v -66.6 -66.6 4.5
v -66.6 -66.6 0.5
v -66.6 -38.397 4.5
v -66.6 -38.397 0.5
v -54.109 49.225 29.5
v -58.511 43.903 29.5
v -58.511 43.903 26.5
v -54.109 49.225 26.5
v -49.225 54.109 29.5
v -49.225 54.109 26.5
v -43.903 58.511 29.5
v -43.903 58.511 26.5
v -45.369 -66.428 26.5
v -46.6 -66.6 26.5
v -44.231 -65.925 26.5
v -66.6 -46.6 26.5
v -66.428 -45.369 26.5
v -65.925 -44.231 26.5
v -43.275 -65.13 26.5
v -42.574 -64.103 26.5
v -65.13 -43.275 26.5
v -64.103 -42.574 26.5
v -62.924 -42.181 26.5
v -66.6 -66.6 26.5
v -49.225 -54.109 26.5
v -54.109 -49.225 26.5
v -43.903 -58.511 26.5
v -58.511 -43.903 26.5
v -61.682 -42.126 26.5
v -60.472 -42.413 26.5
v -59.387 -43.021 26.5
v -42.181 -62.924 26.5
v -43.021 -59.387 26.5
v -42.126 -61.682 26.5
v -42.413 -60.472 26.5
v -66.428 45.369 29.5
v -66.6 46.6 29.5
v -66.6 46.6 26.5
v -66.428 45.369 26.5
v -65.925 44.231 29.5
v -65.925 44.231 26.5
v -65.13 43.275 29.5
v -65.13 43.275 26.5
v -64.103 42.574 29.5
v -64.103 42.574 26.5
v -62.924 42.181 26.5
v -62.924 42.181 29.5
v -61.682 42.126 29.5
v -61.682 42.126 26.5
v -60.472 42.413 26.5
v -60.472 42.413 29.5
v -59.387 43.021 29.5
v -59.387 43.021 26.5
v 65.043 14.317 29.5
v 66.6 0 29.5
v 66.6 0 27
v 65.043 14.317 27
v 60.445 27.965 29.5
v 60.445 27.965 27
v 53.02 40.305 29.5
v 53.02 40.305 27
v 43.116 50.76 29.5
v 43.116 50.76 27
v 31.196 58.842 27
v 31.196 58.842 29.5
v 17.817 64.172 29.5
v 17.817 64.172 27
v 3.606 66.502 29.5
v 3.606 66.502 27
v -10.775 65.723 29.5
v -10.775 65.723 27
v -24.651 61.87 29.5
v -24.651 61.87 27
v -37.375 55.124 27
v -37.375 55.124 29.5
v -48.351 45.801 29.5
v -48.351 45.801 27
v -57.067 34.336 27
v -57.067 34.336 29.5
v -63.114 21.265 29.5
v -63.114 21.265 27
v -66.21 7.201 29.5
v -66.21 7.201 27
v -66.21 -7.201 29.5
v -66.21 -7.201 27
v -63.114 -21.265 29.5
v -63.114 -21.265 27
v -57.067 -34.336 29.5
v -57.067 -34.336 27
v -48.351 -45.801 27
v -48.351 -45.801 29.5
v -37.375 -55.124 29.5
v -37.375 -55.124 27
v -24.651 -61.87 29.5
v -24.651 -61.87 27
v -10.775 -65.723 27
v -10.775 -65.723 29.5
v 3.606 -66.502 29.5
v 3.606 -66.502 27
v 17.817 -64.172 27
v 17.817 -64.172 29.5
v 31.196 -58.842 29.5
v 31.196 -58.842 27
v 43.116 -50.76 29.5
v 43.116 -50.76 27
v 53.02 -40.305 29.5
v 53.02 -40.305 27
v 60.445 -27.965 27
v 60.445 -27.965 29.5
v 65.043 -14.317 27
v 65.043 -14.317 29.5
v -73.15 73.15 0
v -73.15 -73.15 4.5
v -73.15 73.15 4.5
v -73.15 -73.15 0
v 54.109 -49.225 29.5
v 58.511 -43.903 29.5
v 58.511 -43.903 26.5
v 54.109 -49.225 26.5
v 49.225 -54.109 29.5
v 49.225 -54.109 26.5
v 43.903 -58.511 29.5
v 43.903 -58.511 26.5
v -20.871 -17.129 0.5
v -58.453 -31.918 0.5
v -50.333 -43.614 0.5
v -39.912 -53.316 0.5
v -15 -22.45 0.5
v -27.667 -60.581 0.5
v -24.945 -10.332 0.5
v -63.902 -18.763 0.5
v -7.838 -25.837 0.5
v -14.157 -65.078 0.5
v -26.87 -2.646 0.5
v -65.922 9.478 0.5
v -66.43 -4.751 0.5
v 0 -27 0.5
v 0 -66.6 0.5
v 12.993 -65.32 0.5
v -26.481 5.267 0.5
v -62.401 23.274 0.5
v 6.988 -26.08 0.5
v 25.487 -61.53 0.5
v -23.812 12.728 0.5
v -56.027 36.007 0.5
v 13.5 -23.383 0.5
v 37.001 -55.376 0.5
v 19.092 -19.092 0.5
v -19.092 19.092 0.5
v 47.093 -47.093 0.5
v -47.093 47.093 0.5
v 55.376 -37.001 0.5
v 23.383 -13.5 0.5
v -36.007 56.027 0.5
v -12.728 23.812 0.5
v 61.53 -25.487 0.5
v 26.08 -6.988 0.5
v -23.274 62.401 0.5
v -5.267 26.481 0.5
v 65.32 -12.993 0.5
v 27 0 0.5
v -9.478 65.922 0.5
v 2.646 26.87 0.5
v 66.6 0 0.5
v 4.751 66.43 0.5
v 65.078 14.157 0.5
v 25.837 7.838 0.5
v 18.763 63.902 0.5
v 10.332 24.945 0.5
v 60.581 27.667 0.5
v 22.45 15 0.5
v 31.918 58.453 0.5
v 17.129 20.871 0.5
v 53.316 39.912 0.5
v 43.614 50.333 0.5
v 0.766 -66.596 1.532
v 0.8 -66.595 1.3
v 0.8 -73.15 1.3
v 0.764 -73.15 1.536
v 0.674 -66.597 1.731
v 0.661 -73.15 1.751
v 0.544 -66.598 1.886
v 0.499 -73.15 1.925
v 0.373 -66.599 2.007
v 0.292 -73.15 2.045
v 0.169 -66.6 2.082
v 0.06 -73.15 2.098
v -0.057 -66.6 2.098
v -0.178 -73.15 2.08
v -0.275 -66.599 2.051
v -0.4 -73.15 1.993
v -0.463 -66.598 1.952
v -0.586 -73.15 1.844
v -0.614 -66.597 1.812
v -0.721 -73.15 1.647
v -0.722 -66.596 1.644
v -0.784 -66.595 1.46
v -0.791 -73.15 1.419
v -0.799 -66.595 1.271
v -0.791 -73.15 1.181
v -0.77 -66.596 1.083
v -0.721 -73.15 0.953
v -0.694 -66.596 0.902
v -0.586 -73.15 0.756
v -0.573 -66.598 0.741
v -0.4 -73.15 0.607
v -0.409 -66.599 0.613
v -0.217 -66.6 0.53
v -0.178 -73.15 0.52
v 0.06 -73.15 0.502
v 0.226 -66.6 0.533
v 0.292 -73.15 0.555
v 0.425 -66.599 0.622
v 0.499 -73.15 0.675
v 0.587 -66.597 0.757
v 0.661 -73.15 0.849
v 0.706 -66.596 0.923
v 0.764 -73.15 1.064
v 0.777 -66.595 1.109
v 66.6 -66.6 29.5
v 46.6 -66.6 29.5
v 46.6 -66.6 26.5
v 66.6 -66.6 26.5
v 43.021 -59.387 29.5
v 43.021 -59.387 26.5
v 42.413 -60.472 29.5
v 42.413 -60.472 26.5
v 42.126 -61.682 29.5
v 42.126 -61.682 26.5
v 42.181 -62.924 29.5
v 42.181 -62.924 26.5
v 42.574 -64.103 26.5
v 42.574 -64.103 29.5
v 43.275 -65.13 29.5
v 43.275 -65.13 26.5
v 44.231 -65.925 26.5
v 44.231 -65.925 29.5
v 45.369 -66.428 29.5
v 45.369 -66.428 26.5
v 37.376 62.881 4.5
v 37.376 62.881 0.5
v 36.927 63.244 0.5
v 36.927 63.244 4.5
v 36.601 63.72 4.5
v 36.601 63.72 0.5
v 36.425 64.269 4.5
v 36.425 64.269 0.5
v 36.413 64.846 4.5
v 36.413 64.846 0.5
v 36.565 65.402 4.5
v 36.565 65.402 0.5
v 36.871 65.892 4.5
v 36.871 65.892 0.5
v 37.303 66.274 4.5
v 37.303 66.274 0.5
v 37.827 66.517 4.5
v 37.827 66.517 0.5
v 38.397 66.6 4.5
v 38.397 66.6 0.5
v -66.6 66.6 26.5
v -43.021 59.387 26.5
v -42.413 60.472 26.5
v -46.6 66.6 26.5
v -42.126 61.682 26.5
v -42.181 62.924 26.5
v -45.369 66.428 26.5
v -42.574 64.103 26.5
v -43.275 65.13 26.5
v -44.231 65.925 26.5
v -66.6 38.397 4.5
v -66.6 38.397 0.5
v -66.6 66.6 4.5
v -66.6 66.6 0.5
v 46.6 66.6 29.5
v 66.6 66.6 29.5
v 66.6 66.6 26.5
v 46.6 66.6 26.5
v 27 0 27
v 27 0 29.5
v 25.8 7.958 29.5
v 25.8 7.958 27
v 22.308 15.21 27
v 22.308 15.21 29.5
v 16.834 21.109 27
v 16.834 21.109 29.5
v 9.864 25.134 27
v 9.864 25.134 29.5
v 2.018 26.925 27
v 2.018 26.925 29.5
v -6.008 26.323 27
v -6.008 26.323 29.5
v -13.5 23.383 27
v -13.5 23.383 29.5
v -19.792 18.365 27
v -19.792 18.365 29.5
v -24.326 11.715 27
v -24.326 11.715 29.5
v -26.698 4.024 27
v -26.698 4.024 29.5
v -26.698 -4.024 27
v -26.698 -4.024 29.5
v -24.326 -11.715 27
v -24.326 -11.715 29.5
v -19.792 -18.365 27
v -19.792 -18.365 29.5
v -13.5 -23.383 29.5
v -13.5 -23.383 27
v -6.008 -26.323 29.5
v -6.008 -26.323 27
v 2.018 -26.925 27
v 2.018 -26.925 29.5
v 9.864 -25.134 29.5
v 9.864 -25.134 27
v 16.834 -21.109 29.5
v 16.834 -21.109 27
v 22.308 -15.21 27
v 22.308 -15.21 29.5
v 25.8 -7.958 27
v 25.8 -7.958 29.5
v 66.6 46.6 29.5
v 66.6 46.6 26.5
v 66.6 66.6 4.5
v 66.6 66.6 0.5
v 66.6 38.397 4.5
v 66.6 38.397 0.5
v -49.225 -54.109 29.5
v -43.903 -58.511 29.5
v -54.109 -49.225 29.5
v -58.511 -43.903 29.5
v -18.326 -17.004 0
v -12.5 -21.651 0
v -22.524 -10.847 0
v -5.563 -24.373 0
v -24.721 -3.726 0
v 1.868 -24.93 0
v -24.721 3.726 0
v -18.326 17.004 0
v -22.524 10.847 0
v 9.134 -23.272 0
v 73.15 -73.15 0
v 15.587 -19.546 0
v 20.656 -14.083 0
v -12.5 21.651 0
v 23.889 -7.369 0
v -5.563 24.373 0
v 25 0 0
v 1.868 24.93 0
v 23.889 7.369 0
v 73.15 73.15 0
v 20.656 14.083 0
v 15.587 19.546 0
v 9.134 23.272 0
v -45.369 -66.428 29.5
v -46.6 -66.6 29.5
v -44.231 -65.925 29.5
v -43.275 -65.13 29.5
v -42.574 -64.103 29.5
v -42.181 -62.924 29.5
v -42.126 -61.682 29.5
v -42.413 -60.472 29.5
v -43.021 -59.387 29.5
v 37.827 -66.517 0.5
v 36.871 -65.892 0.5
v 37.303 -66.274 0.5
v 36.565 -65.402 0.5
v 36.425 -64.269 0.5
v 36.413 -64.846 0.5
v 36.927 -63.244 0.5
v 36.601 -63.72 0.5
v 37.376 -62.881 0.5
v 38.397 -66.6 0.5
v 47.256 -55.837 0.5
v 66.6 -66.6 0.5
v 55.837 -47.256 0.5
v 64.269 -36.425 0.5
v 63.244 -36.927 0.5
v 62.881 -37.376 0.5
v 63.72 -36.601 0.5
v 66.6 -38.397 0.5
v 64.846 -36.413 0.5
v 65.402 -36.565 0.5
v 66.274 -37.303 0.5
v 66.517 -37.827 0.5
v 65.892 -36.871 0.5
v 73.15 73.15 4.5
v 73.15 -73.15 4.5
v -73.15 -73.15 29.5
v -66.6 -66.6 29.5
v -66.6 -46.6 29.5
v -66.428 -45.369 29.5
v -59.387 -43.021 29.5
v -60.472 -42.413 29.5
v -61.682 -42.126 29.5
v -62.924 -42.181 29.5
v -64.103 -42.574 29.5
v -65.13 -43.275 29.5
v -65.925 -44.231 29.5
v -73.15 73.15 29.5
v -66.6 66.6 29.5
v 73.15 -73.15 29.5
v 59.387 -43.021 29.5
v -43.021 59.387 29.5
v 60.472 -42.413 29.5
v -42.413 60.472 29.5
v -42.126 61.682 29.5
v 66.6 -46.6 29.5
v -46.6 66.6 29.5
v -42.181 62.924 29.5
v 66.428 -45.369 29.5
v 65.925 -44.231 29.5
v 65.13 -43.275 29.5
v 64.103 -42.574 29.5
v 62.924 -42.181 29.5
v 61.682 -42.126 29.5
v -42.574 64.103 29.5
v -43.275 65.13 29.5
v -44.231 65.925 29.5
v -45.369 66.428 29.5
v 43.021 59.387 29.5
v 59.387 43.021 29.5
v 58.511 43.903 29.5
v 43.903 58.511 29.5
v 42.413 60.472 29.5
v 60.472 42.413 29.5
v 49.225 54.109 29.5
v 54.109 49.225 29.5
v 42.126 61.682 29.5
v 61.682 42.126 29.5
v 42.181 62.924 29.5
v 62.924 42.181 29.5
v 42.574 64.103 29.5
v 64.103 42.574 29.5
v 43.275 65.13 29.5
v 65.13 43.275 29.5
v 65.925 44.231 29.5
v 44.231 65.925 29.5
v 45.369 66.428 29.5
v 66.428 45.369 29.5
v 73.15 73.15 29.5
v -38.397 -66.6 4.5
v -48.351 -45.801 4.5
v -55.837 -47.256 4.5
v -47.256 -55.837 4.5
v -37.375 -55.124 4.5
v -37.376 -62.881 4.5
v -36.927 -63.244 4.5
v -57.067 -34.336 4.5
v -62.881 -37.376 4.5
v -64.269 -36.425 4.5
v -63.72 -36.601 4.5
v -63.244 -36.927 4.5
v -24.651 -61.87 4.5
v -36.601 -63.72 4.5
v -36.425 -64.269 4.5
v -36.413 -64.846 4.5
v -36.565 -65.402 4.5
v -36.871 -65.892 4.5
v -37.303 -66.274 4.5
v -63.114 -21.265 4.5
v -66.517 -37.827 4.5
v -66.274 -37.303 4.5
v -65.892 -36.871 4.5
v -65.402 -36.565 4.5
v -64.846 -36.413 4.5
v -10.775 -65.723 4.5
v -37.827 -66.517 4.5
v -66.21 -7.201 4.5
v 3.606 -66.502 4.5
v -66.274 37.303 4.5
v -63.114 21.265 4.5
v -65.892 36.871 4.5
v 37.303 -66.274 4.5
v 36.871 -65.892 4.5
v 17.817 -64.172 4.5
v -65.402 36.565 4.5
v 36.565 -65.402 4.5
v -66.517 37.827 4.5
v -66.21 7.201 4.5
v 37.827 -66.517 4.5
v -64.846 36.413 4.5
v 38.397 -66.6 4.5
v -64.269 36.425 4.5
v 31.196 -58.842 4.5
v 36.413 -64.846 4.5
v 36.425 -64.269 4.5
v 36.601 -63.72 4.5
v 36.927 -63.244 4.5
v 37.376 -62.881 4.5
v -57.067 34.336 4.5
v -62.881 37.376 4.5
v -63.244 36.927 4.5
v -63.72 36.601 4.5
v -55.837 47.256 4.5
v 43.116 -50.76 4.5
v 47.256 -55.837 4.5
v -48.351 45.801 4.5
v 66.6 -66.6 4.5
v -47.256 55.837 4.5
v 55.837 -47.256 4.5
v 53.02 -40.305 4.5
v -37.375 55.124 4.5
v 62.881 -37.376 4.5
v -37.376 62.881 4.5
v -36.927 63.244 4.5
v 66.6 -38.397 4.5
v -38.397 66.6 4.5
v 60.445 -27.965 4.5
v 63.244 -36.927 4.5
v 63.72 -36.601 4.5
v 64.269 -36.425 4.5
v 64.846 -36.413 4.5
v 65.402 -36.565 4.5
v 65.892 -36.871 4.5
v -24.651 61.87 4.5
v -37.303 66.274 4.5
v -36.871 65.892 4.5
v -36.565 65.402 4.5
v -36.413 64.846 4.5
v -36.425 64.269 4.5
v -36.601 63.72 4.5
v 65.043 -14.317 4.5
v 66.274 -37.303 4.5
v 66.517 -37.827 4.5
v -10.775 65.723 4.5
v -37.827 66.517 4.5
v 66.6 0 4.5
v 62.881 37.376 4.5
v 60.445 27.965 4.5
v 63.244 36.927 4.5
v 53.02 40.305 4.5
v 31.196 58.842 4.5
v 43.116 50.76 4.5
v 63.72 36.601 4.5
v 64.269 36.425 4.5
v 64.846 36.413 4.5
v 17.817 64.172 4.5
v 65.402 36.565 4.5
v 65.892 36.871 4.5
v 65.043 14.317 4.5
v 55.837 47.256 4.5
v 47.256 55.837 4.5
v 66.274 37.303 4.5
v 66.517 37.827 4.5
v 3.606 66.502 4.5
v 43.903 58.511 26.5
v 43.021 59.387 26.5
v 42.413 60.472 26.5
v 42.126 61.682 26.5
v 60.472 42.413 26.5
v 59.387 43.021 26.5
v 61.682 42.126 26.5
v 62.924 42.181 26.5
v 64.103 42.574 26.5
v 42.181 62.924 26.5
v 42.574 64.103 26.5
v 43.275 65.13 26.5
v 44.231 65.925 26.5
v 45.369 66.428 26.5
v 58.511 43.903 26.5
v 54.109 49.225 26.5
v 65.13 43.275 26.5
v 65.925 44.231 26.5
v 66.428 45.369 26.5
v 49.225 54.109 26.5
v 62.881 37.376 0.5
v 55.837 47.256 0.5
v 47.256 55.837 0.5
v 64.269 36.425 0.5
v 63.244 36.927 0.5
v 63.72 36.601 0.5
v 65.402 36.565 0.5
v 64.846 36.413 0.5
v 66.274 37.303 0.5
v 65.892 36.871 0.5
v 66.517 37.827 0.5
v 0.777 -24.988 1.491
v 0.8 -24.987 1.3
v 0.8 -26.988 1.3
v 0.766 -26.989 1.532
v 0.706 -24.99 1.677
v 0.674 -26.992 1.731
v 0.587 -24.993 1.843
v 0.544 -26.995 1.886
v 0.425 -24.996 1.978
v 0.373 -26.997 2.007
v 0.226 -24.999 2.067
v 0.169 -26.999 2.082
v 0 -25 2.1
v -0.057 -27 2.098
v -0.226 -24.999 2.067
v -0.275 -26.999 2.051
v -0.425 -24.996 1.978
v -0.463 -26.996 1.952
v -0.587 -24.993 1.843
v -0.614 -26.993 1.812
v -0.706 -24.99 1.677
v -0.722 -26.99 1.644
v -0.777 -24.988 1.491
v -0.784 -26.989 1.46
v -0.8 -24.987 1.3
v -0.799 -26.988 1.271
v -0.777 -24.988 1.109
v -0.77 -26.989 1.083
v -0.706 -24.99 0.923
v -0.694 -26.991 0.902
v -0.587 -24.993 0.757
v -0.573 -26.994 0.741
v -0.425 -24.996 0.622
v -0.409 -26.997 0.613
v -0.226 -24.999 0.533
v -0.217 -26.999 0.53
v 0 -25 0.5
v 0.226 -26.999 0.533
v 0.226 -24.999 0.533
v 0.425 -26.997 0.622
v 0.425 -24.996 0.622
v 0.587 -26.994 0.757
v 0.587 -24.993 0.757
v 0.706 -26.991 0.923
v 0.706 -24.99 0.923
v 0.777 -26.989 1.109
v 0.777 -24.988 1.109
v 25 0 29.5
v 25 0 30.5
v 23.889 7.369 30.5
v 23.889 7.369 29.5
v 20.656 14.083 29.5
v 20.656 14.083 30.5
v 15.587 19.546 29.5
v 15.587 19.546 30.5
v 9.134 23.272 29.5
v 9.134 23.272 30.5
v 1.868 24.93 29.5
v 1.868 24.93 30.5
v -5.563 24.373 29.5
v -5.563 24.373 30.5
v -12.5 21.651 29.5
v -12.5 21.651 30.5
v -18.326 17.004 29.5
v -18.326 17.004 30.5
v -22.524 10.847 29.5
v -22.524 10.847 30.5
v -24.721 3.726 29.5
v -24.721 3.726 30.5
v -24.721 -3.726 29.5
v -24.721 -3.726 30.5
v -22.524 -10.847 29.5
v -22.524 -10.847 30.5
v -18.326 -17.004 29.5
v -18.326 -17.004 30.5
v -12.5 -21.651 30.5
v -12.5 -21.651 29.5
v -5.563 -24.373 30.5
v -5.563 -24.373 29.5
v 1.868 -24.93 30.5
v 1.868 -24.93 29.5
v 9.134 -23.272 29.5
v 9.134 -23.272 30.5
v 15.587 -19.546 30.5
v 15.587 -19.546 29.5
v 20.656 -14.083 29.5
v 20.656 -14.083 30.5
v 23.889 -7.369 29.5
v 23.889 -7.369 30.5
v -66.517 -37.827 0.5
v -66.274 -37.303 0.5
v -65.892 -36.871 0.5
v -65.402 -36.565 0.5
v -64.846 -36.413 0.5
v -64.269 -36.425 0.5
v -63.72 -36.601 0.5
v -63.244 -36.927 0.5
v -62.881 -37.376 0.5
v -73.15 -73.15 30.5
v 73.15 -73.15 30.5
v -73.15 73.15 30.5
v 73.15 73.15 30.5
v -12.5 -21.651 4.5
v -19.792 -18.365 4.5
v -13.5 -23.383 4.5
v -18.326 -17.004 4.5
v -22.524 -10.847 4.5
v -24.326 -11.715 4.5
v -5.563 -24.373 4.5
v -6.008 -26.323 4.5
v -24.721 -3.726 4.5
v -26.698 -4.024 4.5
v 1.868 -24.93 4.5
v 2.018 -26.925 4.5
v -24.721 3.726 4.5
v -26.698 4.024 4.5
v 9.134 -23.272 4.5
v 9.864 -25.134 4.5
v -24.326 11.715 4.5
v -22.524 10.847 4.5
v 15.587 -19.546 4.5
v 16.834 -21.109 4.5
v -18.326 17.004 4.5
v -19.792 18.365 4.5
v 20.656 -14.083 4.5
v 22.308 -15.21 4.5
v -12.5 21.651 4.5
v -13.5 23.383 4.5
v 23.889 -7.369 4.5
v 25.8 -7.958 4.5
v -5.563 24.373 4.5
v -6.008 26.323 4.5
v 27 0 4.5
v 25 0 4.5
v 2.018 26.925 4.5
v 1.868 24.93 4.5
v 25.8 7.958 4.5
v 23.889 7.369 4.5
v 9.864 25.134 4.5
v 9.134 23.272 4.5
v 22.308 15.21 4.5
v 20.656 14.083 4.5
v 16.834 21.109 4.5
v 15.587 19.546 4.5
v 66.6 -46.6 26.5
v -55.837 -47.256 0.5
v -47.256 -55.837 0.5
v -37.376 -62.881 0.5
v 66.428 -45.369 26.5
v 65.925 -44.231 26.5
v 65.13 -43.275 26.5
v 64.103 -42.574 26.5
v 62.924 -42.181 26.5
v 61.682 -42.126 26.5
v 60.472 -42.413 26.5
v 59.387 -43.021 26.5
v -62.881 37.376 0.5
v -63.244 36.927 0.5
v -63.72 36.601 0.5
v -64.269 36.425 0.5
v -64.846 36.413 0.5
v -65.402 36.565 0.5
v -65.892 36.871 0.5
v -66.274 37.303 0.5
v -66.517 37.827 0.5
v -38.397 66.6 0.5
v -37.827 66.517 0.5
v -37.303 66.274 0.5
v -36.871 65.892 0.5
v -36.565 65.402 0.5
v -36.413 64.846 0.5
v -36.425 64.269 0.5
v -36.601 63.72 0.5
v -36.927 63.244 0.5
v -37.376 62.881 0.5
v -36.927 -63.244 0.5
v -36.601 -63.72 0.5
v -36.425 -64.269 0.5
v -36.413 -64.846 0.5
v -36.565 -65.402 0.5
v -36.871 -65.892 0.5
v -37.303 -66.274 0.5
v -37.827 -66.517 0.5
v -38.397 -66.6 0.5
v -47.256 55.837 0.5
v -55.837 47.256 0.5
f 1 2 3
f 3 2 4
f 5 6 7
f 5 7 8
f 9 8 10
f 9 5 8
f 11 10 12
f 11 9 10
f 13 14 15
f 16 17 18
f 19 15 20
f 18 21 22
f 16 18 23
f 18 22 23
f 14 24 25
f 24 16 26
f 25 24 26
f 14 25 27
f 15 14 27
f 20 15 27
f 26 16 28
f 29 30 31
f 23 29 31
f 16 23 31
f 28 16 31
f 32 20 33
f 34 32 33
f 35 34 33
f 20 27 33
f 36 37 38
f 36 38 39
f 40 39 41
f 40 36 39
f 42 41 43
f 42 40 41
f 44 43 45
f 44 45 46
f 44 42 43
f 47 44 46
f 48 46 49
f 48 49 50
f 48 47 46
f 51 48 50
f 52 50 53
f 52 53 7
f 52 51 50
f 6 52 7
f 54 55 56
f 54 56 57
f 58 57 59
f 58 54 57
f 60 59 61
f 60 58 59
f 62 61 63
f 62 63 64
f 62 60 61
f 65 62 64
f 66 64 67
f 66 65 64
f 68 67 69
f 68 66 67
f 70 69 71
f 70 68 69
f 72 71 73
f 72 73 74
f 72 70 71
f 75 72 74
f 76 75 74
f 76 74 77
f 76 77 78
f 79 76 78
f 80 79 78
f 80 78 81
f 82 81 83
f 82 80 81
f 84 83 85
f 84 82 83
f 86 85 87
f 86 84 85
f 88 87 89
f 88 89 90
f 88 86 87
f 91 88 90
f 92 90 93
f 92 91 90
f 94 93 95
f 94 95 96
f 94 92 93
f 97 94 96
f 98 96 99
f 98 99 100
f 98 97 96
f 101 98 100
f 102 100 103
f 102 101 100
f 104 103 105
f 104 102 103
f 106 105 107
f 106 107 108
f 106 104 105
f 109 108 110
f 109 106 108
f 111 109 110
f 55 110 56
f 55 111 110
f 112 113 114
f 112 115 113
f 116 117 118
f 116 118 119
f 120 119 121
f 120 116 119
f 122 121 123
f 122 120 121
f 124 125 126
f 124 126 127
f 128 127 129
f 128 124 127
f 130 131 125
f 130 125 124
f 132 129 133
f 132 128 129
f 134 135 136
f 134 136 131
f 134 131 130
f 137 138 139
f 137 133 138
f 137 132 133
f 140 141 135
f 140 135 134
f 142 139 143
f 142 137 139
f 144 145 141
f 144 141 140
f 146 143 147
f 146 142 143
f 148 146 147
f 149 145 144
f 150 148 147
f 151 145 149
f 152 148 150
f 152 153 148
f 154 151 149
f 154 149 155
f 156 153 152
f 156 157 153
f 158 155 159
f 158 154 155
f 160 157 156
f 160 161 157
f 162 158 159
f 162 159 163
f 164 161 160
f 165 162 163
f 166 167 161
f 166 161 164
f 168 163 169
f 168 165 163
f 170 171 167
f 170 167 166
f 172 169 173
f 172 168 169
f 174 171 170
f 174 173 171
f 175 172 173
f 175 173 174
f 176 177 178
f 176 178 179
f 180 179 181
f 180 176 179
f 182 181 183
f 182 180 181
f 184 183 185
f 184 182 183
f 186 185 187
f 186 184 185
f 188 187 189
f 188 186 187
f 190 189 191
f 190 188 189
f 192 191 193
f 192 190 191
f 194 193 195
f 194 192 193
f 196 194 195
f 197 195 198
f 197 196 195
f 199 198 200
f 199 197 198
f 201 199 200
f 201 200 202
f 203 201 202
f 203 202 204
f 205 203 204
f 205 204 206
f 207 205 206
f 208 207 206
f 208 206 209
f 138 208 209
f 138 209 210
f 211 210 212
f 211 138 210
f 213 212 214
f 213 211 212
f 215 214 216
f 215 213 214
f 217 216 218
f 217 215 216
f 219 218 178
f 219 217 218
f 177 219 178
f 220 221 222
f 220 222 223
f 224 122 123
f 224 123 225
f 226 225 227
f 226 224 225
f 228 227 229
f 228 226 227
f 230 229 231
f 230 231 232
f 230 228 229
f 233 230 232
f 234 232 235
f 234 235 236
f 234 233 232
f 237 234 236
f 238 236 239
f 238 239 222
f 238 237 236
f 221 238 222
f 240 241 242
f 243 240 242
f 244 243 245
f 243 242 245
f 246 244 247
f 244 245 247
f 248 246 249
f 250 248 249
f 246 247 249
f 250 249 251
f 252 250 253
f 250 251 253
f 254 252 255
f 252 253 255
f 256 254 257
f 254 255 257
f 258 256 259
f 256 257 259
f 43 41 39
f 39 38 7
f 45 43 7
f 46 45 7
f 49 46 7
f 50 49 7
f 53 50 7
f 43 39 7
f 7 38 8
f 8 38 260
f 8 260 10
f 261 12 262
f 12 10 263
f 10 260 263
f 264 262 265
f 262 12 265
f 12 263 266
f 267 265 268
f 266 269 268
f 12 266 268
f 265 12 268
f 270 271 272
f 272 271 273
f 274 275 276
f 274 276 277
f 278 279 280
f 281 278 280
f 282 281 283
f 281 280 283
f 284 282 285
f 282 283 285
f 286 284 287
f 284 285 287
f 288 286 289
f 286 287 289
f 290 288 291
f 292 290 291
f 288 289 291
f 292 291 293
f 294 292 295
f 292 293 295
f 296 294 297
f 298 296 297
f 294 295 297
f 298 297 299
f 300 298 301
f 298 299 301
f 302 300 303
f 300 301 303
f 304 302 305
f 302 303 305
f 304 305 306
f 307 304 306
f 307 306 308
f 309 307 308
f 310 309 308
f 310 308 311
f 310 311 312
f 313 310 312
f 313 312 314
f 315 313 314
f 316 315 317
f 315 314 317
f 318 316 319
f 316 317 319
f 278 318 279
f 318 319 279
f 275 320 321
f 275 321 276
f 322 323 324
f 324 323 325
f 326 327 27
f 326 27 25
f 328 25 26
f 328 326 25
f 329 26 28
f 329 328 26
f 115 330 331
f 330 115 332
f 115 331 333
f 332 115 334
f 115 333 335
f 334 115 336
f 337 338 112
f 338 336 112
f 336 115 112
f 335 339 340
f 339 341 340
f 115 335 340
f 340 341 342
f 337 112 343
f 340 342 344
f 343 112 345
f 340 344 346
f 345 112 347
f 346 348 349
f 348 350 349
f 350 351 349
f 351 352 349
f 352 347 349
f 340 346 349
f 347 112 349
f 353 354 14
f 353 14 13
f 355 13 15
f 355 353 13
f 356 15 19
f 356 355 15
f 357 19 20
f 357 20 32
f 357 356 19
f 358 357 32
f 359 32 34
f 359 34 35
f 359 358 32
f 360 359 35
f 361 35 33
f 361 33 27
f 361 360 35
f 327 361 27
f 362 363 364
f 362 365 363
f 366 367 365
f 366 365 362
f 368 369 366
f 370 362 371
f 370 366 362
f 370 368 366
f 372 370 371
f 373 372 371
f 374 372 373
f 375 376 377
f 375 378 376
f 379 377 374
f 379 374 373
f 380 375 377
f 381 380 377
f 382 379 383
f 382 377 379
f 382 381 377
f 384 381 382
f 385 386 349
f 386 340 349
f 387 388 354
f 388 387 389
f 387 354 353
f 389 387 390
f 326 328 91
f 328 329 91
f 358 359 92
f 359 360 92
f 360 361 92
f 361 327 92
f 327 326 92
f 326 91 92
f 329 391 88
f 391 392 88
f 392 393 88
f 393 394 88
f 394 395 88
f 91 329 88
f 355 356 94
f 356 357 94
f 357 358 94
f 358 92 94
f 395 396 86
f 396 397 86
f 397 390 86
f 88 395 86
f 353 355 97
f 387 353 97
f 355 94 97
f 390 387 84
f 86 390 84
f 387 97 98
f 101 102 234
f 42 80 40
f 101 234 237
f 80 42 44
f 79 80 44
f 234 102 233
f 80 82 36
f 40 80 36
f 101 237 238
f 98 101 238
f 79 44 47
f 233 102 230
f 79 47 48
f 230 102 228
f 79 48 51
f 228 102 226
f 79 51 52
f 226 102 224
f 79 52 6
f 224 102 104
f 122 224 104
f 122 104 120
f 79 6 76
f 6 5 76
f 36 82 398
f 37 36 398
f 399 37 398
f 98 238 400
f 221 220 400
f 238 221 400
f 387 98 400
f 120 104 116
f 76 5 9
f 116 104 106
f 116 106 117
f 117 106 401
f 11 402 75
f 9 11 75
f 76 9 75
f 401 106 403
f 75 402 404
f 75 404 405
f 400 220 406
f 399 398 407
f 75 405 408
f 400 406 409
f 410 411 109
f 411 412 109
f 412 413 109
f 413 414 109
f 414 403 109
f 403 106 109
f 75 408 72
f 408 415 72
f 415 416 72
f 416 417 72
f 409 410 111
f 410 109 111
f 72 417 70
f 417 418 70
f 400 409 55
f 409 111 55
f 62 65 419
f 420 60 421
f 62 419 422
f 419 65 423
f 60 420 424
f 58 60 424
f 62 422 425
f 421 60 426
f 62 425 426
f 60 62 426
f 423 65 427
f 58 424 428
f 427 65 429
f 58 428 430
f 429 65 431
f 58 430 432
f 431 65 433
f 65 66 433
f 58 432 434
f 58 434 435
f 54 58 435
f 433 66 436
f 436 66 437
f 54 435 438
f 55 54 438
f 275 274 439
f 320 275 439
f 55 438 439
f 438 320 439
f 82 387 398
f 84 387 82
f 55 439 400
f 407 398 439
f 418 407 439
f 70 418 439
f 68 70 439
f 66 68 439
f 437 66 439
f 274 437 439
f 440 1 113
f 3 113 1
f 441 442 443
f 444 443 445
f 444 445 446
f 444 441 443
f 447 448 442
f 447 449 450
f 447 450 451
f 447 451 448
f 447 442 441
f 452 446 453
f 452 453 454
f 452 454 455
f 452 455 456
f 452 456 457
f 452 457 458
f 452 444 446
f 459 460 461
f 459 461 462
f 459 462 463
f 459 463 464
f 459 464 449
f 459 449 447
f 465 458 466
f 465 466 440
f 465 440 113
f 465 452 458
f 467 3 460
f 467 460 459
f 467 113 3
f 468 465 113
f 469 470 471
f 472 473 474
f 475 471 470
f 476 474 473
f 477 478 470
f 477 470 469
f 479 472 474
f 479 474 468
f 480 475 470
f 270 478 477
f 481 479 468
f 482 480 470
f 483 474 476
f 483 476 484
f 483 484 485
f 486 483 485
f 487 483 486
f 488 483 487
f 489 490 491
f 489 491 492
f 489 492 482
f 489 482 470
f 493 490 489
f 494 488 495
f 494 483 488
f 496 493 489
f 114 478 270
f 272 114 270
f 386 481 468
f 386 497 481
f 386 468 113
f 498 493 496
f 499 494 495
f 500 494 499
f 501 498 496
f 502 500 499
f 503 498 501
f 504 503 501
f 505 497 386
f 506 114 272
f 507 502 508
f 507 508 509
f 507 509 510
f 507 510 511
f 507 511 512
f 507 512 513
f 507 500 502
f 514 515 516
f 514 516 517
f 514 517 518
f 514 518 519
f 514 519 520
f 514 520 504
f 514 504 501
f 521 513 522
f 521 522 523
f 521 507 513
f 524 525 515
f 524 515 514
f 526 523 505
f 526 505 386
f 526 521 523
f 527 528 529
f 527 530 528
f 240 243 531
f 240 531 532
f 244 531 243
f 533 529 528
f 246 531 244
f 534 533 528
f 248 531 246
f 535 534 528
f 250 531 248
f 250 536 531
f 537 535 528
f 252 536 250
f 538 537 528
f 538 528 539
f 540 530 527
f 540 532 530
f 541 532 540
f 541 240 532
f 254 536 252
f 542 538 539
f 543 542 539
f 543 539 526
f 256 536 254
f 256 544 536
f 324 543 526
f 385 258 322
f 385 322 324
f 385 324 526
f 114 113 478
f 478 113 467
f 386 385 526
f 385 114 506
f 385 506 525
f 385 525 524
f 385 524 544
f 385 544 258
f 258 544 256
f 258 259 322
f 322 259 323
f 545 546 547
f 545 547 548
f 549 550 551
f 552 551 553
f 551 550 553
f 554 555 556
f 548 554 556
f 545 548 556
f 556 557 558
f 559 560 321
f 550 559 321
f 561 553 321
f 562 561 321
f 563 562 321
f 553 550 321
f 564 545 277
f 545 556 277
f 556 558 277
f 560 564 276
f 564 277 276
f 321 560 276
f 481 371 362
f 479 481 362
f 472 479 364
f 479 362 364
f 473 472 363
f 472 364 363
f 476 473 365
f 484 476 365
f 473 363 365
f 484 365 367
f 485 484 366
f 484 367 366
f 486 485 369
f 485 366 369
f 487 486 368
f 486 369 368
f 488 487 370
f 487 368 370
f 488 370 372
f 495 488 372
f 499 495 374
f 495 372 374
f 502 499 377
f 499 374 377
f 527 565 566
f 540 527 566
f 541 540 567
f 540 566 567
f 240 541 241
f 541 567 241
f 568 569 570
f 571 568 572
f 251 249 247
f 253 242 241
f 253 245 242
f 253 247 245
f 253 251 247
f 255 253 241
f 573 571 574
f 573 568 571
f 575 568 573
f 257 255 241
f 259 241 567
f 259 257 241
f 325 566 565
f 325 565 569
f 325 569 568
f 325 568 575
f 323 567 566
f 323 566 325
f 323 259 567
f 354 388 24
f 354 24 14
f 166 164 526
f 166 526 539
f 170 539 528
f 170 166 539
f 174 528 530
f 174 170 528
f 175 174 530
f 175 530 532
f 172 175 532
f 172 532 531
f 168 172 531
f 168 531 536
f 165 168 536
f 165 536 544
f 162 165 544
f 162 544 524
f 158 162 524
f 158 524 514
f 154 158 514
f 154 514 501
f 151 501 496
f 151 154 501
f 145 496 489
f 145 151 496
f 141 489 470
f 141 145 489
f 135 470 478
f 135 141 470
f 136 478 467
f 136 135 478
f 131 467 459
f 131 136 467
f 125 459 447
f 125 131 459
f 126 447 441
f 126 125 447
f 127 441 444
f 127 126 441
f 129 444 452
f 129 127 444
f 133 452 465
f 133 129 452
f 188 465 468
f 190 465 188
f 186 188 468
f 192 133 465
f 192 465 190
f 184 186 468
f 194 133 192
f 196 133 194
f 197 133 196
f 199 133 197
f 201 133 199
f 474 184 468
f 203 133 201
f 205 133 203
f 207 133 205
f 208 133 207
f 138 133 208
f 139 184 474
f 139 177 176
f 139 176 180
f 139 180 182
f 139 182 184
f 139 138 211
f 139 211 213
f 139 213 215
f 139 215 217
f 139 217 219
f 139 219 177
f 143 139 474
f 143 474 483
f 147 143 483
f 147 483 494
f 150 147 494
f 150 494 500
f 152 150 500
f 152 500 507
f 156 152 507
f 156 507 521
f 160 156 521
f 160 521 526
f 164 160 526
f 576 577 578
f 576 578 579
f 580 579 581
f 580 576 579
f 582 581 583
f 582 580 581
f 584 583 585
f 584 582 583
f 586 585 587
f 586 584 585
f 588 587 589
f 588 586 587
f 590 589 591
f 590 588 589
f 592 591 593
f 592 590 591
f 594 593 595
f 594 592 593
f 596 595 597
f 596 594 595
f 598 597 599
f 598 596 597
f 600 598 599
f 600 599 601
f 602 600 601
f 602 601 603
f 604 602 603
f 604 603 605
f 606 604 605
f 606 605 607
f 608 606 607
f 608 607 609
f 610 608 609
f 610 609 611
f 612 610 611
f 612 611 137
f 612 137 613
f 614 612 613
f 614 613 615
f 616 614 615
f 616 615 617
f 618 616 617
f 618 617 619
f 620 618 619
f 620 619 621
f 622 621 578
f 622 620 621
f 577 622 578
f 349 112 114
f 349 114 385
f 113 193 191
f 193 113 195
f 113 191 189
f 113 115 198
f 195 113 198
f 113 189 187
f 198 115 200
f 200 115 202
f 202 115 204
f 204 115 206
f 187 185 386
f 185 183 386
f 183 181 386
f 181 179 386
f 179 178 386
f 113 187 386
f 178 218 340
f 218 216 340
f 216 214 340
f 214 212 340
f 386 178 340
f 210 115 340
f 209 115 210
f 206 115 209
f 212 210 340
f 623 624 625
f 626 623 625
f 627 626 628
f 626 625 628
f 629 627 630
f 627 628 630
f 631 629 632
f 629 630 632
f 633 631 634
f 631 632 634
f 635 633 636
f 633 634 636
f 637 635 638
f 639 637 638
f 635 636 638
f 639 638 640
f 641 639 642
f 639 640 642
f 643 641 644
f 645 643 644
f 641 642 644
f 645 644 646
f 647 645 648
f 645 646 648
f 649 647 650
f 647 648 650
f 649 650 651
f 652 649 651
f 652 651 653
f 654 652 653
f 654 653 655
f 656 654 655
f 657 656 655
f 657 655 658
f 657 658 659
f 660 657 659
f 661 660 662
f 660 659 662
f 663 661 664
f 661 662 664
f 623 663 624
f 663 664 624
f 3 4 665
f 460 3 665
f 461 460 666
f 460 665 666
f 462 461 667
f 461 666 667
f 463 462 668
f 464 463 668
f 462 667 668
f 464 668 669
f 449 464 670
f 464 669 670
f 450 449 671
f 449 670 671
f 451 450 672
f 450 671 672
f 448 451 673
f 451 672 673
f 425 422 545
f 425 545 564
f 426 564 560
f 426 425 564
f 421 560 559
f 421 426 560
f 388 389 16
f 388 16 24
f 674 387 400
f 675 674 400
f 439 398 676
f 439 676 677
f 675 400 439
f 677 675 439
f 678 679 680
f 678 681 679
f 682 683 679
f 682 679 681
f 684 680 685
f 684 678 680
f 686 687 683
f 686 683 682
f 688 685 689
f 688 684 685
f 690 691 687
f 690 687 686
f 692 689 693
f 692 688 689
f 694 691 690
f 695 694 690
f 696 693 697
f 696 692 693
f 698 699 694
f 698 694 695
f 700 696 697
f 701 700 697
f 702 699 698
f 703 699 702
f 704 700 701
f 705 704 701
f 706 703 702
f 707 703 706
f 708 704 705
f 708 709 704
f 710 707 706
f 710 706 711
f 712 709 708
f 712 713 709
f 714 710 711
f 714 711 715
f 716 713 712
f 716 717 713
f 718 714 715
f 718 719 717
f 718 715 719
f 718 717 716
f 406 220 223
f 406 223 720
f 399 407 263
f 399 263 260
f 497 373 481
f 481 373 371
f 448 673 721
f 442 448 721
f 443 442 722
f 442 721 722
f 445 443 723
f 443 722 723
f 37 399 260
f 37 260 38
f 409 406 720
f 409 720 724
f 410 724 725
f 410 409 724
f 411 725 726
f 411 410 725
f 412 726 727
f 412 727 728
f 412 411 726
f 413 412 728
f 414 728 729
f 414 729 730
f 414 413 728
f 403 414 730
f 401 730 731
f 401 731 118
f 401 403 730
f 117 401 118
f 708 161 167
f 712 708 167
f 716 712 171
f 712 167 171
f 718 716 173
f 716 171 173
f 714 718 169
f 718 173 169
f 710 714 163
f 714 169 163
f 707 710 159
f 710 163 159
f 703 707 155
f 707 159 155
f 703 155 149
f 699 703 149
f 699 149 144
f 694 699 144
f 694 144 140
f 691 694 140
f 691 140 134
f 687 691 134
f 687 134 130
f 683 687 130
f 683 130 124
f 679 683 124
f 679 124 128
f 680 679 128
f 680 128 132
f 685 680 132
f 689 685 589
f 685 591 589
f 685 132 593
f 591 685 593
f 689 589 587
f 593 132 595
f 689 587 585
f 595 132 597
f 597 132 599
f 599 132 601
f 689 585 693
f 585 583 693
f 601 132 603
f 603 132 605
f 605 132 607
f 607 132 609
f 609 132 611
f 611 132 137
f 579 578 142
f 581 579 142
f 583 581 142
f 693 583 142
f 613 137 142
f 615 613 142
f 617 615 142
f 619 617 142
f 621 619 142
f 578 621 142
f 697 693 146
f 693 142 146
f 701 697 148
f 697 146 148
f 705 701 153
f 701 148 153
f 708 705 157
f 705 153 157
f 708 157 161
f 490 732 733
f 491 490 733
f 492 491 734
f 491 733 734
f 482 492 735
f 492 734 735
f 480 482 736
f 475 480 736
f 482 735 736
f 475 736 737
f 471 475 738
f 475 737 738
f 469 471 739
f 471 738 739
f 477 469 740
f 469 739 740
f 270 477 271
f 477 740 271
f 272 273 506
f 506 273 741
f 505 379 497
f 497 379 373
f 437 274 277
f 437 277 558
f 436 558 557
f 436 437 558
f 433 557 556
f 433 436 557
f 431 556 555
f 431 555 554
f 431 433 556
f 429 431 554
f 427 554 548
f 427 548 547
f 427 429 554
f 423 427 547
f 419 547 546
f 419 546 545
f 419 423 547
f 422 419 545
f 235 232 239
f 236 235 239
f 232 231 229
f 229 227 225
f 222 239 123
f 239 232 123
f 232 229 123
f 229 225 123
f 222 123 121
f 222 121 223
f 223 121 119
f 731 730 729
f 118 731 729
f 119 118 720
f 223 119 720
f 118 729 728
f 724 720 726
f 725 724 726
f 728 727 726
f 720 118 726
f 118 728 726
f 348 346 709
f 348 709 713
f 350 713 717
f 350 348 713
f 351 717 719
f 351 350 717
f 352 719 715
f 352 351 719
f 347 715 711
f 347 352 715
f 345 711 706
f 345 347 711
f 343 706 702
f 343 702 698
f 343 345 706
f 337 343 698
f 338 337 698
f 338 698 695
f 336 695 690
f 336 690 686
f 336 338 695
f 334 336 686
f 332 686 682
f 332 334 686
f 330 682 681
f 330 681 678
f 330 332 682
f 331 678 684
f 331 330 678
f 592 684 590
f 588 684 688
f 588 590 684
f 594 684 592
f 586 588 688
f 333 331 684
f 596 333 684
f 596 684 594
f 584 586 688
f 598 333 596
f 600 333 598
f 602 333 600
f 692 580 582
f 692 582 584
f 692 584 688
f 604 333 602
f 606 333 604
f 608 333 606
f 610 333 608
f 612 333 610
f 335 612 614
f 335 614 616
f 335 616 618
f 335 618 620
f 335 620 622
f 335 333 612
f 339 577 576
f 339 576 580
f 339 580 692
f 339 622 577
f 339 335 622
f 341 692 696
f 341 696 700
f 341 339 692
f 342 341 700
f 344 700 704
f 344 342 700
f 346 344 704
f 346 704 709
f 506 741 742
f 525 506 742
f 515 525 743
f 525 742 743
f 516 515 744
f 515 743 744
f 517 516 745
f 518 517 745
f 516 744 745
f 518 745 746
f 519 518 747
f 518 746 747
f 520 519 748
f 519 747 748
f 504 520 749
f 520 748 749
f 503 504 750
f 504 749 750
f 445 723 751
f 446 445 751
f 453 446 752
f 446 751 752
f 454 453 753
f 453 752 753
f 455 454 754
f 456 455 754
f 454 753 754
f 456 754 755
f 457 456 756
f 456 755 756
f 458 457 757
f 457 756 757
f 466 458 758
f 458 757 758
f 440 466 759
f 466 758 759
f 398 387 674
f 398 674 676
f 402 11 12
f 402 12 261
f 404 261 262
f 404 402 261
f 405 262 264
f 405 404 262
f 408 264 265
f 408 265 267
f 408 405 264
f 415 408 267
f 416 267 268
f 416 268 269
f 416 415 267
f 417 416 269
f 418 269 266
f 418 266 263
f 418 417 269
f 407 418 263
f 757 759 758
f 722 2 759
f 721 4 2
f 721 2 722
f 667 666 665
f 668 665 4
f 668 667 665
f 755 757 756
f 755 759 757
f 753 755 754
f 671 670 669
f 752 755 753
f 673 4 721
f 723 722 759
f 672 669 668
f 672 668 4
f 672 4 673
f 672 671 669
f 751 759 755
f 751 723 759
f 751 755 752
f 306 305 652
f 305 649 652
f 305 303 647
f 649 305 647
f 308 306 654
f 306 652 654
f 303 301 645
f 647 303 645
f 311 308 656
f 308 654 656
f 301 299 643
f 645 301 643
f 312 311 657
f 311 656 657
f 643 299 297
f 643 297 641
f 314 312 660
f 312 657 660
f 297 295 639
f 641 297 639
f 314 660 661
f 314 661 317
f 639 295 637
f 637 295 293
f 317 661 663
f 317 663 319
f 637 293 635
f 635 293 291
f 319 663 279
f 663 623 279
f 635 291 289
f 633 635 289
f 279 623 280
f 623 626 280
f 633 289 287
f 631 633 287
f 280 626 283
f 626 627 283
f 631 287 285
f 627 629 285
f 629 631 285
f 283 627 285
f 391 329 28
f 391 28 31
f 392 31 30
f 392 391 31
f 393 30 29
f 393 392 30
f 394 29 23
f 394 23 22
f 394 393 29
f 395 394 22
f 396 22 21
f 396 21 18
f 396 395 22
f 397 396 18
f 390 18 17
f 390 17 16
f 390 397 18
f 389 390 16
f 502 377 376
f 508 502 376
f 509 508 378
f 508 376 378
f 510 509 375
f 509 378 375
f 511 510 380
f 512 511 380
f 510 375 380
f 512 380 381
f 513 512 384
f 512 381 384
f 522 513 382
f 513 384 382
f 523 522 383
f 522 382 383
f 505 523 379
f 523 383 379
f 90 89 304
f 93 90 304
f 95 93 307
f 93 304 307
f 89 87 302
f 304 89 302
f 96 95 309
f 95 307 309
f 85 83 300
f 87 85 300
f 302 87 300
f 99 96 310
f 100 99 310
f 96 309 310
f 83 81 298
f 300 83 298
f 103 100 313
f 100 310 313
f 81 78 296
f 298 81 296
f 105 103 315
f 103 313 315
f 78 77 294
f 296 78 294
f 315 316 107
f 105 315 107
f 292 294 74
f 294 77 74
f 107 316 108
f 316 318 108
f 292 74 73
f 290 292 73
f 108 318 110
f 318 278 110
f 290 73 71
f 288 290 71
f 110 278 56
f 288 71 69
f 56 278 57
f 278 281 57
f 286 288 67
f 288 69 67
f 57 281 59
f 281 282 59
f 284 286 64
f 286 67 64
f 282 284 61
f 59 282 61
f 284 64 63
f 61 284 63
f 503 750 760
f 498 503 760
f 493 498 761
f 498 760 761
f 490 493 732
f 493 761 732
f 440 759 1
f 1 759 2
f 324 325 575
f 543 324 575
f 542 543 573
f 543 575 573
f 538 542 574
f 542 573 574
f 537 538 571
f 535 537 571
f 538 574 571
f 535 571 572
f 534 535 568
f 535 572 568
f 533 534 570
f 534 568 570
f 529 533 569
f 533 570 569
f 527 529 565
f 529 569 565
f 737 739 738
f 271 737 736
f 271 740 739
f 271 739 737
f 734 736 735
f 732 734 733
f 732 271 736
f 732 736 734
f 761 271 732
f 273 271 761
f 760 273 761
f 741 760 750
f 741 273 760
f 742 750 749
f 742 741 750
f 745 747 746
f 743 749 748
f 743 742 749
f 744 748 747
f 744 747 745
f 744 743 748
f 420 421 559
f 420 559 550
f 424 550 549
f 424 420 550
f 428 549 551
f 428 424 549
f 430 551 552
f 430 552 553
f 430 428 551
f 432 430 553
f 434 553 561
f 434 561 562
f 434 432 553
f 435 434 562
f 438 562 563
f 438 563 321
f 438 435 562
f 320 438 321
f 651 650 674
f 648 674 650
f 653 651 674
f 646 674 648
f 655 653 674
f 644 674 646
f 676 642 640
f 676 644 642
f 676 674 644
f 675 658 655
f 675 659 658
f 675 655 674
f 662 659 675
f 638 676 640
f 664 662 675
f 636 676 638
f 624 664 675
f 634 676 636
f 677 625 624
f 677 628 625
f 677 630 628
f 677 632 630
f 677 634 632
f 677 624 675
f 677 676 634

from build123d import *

# Parameters (mm, degrees)
F0_W      = 146.3
F0_H      = 146.3
F0_R      = 25
F1_DEPTH  = 0.5
F2_W      = 146.3
F2_H      = 146.3
F2_R      = 66.6
F3_DEPTH  = 4
F2_R_2    = 27
F2_R_3    = 25
F4_DEPTH  = 4
F5_R      = 0.8
F6_DEPTH  = 73.151
F8_W      = 146.3
F8_H      = 146.3
F8_R      = 66.6
F8_R_2    = 27
F9_DEPTH  = 1
F10_DEPTH = 2.5
F11_DEPTH = 3
F12_R     = 27
F12_R_2   = 25
F13_DEPTH = 1


with BuildPart() as f1:
    # F0 (on Top) → F1 (new body)
    with BuildSketch(Plane.XY):
        Rectangle(F0_W, F0_H)
        Circle(F0_R, mode=Mode.SUBTRACT)
    extrude(amount=F1_DEPTH)

    # F2 (on face) → F3 (join)
    with BuildSketch(Plane.XY.offset(0.5)):
        Rectangle(F2_W, F2_H)
        with BuildLine():
            ThreePointArc((-37.375541, -62.880772), (-36.468898, -65.129879), (-38.397428, -66.6))
            Line((-38.397428, -66.6), (-66.6, -66.6))
            Line((-66.6, -66.6), (-66.6, -38.397428))
            ThreePointArc((-66.6, -38.397428), (-65.129879, -36.468898), (-62.880772, -37.375541))
            ThreePointArc((-62.880772, -37.375541), (-51.724861, -51.724861), (-37.375541, -62.880772))
        make_face(mode=Mode.SUBTRACT)
        with BuildLine():
            ThreePointArc((62.880772, -37.375541), (65.129879, -36.468898), (66.6, -38.397428))
            Line((66.6, -38.397428), (66.6, -66.6))
            Line((66.6, -66.6), (38.397428, -66.6))
            ThreePointArc((38.397428, -66.6), (36.468898, -65.129879), (37.375541, -62.880772))
            ThreePointArc((37.375541, -62.880772), (51.724861, -51.724861), (62.880772, -37.375541))
        make_face(mode=Mode.SUBTRACT)
        with BuildLine():
            ThreePointArc((-38.397428, 66.6), (-36.468898, 65.129879), (-37.375541, 62.880772))
            ThreePointArc((-37.375541, 62.880772), (-51.724861, 51.724861), (-62.880772, 37.375541))
            ThreePointArc((-62.880772, 37.375541), (-65.129879, 36.468898), (-66.6, 38.397428))
            Line((-66.6, 38.397428), (-66.6, 66.6))
            Line((-66.6, 66.6), (-38.397428, 66.6))
        make_face(mode=Mode.SUBTRACT)
        Circle(F2_R, mode=Mode.SUBTRACT)
        with BuildLine():
            ThreePointArc((37.375541, 62.880772), (36.468898, 65.129879), (38.397428, 66.6))
            Line((38.397428, 66.6), (66.6, 66.6))
            Line((66.6, 66.6), (66.6, 38.397428))
            ThreePointArc((66.6, 38.397428), (65.129879, 36.468898), (62.880772, 37.375541))
            ThreePointArc((62.880772, 37.375541), (51.724861, 51.724861), (37.375541, 62.880772))
        make_face(mode=Mode.SUBTRACT)
    extrude(amount=F3_DEPTH)

    # F2 (on face) → F4 (join)
    with BuildSketch(Plane.XY.offset(0.5)):
        Circle(F2_R_2)
        Circle(F2_R_3, mode=Mode.SUBTRACT)
    extrude(amount=F4_DEPTH)

    # F5 (on Front) → F6 (cut, through all)
    with BuildSketch(Plane.XZ):
        with Locations((0, 1.3)):
            Circle(F5_R)
    extrude(amount=F6_DEPTH, mode=Mode.SUBTRACT)


with BuildPart() as f9:
    # F8 (on offset) → F9 (new body)
    with BuildSketch(Plane.XY.offset(29.5)):
        Rectangle(F8_W, F8_H)
        with BuildLine():
            ThreePointArc((-58.510577, -43.902561), (-51.724861, -51.724861), (-43.902561, -58.510577))
            ThreePointArc((-43.902561, -58.510577), (-42.336347, -63.527281), (-46.6, -66.6))
            Line((-46.6, -66.6), (-66.6, -66.6))
            Line((-66.6, -66.6), (-66.6, -46.6))
            ThreePointArc((-66.6, -46.6), (-63.527281, -42.336347), (-58.510577, -43.902561))
        make_face(mode=Mode.SUBTRACT)
        with BuildLine():
            ThreePointArc((43.902561, -58.510577), (51.724861, -51.724861), (58.510577, -43.902561))
            ThreePointArc((58.510577, -43.902561), (63.527281, -42.336347), (66.6, -46.6))
            Line((66.6, -46.6), (66.6, -66.6))
            Line((66.6, -66.6), (46.6, -66.6))
            ThreePointArc((46.6, -66.6), (42.336347, -63.527281), (43.902561, -58.510577))
        make_face(mode=Mode.SUBTRACT)
        with BuildLine():
            Line((-66.6, 66.6), (-46.6, 66.6))
            ThreePointArc((-46.6, 66.6), (-42.336347, 63.527281), (-43.902561, 58.510577))
            ThreePointArc((-43.902561, 58.510577), (-51.724861, 51.724861), (-58.510577, 43.902561))
            ThreePointArc((-58.510577, 43.902561), (-63.527281, 42.336347), (-66.6, 46.6))
            Line((-66.6, 46.6), (-66.6, 66.6))
        make_face(mode=Mode.SUBTRACT)
        Circle(F8_R, mode=Mode.SUBTRACT)
        with BuildLine():
            ThreePointArc((58.510577, 43.902561), (51.724861, 51.724861), (43.902561, 58.510577))
            ThreePointArc((43.902561, 58.510577), (42.336347, 63.527281), (46.6, 66.6))
            Line((46.6, 66.6), (66.6, 66.6))
            Line((66.6, 66.6), (66.6, 46.6))
            ThreePointArc((66.6, 46.6), (63.527281, 42.336347), (58.510577, 43.902561))
        make_face(mode=Mode.SUBTRACT)
        with BuildLine():
            ThreePointArc((-43.902561, 58.510577), (-42.336347, 63.527281), (-46.6, 66.6))
            Line((-46.6, 66.6), (-66.6, 66.6))
            Line((-66.6, 66.6), (-66.6, 46.6))
            ThreePointArc((-66.6, 46.6), (-63.527281, 42.336347), (-58.510577, 43.902561))
            ThreePointArc((-58.510577, 43.902561), (-51.724861, 51.724861), (-43.902561, 58.510577))
        make_face()
        with BuildLine():
            ThreePointArc((46.6, 66.6), (42.336347, 63.527281), (43.902561, 58.510577))
            ThreePointArc((43.902561, 58.510577), (51.724861, 51.724861), (58.510577, 43.902561))
            ThreePointArc((58.510577, 43.902561), (63.527281, 42.336347), (66.6, 46.6))
            Line((66.6, 46.6), (66.6, 66.6))
            Line((66.6, 66.6), (46.6, 66.6))
        make_face()
        with BuildLine():
            ThreePointArc((66.6, -46.6), (63.527281, -42.336347), (58.510577, -43.902561))
            ThreePointArc((58.510577, -43.902561), (51.724861, -51.724861), (43.902561, -58.510577))
            ThreePointArc((43.902561, -58.510577), (42.336347, -63.527281), (46.6, -66.6))
            Line((46.6, -66.6), (66.6, -66.6))
            Line((66.6, -66.6), (66.6, -46.6))
        make_face()
        with BuildLine():
            ThreePointArc((-46.6, -66.6), (-42.336347, -63.527281), (-43.902561, -58.510577))
            ThreePointArc((-43.902561, -58.510577), (-51.724861, -51.724861), (-58.510577, -43.902561))
            ThreePointArc((-58.510577, -43.902561), (-63.527281, -42.336347), (-66.6, -46.6))
            Line((-66.6, -46.6), (-66.6, -66.6))
            Line((-66.6, -66.6), (-46.6, -66.6))
        make_face()
        Circle(F8_R)
        Circle(F8_R_2, mode=Mode.SUBTRACT)
    extrude(amount=F9_DEPTH)

    # F8 (on offset) → F10 (join)
    with BuildSketch(Plane.XY.offset(29.5)):
        Circle(F8_R)
        Circle(F8_R_2, mode=Mode.SUBTRACT)
    extrude(amount=-F10_DEPTH)

    # F8 (on offset) → F11 (join)
    with BuildSketch(Plane.XY.offset(29.5)):
        with BuildLine():
            ThreePointArc((-46.6, -66.6), (-42.336347, -63.527281), (-43.902561, -58.510577))
            ThreePointArc((-43.902561, -58.510577), (-51.724861, -51.724861), (-58.510577, -43.902561))
            ThreePointArc((-58.510577, -43.902561), (-63.527281, -42.336347), (-66.6, -46.6))
            Line((-66.6, -46.6), (-66.6, -66.6))
            Line((-66.6, -66.6), (-46.6, -66.6))
        make_face()
        with BuildLine():
            ThreePointArc((66.6, -46.6), (63.527281, -42.336347), (58.510577, -43.902561))
            ThreePointArc((58.510577, -43.902561), (51.724861, -51.724861), (43.902561, -58.510577))
            ThreePointArc((43.902561, -58.510577), (42.336347, -63.527281), (46.6, -66.6))
            Line((46.6, -66.6), (66.6, -66.6))
            Line((66.6, -66.6), (66.6, -46.6))
        make_face()
        with BuildLine():
            ThreePointArc((-43.902561, 58.510577), (-42.336347, 63.527281), (-46.6, 66.6))
            Line((-46.6, 66.6), (-66.6, 66.6))
            Line((-66.6, 66.6), (-66.6, 46.6))
            ThreePointArc((-66.6, 46.6), (-63.527281, 42.336347), (-58.510577, 43.902561))
            ThreePointArc((-58.510577, 43.902561), (-51.724861, 51.724861), (-43.902561, 58.510577))
        make_face()
        with BuildLine():
            ThreePointArc((46.6, 66.6), (42.336347, 63.527281), (43.902561, 58.510577))
            ThreePointArc((43.902561, 58.510577), (51.724861, 51.724861), (58.510577, 43.902561))
            ThreePointArc((58.510577, 43.902561), (63.527281, 42.336347), (66.6, 46.6))
            Line((66.6, 46.6), (66.6, 66.6))
            Line((66.6, 66.6), (46.6, 66.6))
        make_face()
    extrude(amount=-F11_DEPTH)

    # F12 (on face) → F13 (join)
    with BuildSketch(Plane.XY.offset(30.5)):
        Circle(F12_R)
        Circle(F12_R_2, mode=Mode.SUBTRACT)
    extrude(amount=-F13_DEPTH)


solid = Compound([f1.part, f9.part])
